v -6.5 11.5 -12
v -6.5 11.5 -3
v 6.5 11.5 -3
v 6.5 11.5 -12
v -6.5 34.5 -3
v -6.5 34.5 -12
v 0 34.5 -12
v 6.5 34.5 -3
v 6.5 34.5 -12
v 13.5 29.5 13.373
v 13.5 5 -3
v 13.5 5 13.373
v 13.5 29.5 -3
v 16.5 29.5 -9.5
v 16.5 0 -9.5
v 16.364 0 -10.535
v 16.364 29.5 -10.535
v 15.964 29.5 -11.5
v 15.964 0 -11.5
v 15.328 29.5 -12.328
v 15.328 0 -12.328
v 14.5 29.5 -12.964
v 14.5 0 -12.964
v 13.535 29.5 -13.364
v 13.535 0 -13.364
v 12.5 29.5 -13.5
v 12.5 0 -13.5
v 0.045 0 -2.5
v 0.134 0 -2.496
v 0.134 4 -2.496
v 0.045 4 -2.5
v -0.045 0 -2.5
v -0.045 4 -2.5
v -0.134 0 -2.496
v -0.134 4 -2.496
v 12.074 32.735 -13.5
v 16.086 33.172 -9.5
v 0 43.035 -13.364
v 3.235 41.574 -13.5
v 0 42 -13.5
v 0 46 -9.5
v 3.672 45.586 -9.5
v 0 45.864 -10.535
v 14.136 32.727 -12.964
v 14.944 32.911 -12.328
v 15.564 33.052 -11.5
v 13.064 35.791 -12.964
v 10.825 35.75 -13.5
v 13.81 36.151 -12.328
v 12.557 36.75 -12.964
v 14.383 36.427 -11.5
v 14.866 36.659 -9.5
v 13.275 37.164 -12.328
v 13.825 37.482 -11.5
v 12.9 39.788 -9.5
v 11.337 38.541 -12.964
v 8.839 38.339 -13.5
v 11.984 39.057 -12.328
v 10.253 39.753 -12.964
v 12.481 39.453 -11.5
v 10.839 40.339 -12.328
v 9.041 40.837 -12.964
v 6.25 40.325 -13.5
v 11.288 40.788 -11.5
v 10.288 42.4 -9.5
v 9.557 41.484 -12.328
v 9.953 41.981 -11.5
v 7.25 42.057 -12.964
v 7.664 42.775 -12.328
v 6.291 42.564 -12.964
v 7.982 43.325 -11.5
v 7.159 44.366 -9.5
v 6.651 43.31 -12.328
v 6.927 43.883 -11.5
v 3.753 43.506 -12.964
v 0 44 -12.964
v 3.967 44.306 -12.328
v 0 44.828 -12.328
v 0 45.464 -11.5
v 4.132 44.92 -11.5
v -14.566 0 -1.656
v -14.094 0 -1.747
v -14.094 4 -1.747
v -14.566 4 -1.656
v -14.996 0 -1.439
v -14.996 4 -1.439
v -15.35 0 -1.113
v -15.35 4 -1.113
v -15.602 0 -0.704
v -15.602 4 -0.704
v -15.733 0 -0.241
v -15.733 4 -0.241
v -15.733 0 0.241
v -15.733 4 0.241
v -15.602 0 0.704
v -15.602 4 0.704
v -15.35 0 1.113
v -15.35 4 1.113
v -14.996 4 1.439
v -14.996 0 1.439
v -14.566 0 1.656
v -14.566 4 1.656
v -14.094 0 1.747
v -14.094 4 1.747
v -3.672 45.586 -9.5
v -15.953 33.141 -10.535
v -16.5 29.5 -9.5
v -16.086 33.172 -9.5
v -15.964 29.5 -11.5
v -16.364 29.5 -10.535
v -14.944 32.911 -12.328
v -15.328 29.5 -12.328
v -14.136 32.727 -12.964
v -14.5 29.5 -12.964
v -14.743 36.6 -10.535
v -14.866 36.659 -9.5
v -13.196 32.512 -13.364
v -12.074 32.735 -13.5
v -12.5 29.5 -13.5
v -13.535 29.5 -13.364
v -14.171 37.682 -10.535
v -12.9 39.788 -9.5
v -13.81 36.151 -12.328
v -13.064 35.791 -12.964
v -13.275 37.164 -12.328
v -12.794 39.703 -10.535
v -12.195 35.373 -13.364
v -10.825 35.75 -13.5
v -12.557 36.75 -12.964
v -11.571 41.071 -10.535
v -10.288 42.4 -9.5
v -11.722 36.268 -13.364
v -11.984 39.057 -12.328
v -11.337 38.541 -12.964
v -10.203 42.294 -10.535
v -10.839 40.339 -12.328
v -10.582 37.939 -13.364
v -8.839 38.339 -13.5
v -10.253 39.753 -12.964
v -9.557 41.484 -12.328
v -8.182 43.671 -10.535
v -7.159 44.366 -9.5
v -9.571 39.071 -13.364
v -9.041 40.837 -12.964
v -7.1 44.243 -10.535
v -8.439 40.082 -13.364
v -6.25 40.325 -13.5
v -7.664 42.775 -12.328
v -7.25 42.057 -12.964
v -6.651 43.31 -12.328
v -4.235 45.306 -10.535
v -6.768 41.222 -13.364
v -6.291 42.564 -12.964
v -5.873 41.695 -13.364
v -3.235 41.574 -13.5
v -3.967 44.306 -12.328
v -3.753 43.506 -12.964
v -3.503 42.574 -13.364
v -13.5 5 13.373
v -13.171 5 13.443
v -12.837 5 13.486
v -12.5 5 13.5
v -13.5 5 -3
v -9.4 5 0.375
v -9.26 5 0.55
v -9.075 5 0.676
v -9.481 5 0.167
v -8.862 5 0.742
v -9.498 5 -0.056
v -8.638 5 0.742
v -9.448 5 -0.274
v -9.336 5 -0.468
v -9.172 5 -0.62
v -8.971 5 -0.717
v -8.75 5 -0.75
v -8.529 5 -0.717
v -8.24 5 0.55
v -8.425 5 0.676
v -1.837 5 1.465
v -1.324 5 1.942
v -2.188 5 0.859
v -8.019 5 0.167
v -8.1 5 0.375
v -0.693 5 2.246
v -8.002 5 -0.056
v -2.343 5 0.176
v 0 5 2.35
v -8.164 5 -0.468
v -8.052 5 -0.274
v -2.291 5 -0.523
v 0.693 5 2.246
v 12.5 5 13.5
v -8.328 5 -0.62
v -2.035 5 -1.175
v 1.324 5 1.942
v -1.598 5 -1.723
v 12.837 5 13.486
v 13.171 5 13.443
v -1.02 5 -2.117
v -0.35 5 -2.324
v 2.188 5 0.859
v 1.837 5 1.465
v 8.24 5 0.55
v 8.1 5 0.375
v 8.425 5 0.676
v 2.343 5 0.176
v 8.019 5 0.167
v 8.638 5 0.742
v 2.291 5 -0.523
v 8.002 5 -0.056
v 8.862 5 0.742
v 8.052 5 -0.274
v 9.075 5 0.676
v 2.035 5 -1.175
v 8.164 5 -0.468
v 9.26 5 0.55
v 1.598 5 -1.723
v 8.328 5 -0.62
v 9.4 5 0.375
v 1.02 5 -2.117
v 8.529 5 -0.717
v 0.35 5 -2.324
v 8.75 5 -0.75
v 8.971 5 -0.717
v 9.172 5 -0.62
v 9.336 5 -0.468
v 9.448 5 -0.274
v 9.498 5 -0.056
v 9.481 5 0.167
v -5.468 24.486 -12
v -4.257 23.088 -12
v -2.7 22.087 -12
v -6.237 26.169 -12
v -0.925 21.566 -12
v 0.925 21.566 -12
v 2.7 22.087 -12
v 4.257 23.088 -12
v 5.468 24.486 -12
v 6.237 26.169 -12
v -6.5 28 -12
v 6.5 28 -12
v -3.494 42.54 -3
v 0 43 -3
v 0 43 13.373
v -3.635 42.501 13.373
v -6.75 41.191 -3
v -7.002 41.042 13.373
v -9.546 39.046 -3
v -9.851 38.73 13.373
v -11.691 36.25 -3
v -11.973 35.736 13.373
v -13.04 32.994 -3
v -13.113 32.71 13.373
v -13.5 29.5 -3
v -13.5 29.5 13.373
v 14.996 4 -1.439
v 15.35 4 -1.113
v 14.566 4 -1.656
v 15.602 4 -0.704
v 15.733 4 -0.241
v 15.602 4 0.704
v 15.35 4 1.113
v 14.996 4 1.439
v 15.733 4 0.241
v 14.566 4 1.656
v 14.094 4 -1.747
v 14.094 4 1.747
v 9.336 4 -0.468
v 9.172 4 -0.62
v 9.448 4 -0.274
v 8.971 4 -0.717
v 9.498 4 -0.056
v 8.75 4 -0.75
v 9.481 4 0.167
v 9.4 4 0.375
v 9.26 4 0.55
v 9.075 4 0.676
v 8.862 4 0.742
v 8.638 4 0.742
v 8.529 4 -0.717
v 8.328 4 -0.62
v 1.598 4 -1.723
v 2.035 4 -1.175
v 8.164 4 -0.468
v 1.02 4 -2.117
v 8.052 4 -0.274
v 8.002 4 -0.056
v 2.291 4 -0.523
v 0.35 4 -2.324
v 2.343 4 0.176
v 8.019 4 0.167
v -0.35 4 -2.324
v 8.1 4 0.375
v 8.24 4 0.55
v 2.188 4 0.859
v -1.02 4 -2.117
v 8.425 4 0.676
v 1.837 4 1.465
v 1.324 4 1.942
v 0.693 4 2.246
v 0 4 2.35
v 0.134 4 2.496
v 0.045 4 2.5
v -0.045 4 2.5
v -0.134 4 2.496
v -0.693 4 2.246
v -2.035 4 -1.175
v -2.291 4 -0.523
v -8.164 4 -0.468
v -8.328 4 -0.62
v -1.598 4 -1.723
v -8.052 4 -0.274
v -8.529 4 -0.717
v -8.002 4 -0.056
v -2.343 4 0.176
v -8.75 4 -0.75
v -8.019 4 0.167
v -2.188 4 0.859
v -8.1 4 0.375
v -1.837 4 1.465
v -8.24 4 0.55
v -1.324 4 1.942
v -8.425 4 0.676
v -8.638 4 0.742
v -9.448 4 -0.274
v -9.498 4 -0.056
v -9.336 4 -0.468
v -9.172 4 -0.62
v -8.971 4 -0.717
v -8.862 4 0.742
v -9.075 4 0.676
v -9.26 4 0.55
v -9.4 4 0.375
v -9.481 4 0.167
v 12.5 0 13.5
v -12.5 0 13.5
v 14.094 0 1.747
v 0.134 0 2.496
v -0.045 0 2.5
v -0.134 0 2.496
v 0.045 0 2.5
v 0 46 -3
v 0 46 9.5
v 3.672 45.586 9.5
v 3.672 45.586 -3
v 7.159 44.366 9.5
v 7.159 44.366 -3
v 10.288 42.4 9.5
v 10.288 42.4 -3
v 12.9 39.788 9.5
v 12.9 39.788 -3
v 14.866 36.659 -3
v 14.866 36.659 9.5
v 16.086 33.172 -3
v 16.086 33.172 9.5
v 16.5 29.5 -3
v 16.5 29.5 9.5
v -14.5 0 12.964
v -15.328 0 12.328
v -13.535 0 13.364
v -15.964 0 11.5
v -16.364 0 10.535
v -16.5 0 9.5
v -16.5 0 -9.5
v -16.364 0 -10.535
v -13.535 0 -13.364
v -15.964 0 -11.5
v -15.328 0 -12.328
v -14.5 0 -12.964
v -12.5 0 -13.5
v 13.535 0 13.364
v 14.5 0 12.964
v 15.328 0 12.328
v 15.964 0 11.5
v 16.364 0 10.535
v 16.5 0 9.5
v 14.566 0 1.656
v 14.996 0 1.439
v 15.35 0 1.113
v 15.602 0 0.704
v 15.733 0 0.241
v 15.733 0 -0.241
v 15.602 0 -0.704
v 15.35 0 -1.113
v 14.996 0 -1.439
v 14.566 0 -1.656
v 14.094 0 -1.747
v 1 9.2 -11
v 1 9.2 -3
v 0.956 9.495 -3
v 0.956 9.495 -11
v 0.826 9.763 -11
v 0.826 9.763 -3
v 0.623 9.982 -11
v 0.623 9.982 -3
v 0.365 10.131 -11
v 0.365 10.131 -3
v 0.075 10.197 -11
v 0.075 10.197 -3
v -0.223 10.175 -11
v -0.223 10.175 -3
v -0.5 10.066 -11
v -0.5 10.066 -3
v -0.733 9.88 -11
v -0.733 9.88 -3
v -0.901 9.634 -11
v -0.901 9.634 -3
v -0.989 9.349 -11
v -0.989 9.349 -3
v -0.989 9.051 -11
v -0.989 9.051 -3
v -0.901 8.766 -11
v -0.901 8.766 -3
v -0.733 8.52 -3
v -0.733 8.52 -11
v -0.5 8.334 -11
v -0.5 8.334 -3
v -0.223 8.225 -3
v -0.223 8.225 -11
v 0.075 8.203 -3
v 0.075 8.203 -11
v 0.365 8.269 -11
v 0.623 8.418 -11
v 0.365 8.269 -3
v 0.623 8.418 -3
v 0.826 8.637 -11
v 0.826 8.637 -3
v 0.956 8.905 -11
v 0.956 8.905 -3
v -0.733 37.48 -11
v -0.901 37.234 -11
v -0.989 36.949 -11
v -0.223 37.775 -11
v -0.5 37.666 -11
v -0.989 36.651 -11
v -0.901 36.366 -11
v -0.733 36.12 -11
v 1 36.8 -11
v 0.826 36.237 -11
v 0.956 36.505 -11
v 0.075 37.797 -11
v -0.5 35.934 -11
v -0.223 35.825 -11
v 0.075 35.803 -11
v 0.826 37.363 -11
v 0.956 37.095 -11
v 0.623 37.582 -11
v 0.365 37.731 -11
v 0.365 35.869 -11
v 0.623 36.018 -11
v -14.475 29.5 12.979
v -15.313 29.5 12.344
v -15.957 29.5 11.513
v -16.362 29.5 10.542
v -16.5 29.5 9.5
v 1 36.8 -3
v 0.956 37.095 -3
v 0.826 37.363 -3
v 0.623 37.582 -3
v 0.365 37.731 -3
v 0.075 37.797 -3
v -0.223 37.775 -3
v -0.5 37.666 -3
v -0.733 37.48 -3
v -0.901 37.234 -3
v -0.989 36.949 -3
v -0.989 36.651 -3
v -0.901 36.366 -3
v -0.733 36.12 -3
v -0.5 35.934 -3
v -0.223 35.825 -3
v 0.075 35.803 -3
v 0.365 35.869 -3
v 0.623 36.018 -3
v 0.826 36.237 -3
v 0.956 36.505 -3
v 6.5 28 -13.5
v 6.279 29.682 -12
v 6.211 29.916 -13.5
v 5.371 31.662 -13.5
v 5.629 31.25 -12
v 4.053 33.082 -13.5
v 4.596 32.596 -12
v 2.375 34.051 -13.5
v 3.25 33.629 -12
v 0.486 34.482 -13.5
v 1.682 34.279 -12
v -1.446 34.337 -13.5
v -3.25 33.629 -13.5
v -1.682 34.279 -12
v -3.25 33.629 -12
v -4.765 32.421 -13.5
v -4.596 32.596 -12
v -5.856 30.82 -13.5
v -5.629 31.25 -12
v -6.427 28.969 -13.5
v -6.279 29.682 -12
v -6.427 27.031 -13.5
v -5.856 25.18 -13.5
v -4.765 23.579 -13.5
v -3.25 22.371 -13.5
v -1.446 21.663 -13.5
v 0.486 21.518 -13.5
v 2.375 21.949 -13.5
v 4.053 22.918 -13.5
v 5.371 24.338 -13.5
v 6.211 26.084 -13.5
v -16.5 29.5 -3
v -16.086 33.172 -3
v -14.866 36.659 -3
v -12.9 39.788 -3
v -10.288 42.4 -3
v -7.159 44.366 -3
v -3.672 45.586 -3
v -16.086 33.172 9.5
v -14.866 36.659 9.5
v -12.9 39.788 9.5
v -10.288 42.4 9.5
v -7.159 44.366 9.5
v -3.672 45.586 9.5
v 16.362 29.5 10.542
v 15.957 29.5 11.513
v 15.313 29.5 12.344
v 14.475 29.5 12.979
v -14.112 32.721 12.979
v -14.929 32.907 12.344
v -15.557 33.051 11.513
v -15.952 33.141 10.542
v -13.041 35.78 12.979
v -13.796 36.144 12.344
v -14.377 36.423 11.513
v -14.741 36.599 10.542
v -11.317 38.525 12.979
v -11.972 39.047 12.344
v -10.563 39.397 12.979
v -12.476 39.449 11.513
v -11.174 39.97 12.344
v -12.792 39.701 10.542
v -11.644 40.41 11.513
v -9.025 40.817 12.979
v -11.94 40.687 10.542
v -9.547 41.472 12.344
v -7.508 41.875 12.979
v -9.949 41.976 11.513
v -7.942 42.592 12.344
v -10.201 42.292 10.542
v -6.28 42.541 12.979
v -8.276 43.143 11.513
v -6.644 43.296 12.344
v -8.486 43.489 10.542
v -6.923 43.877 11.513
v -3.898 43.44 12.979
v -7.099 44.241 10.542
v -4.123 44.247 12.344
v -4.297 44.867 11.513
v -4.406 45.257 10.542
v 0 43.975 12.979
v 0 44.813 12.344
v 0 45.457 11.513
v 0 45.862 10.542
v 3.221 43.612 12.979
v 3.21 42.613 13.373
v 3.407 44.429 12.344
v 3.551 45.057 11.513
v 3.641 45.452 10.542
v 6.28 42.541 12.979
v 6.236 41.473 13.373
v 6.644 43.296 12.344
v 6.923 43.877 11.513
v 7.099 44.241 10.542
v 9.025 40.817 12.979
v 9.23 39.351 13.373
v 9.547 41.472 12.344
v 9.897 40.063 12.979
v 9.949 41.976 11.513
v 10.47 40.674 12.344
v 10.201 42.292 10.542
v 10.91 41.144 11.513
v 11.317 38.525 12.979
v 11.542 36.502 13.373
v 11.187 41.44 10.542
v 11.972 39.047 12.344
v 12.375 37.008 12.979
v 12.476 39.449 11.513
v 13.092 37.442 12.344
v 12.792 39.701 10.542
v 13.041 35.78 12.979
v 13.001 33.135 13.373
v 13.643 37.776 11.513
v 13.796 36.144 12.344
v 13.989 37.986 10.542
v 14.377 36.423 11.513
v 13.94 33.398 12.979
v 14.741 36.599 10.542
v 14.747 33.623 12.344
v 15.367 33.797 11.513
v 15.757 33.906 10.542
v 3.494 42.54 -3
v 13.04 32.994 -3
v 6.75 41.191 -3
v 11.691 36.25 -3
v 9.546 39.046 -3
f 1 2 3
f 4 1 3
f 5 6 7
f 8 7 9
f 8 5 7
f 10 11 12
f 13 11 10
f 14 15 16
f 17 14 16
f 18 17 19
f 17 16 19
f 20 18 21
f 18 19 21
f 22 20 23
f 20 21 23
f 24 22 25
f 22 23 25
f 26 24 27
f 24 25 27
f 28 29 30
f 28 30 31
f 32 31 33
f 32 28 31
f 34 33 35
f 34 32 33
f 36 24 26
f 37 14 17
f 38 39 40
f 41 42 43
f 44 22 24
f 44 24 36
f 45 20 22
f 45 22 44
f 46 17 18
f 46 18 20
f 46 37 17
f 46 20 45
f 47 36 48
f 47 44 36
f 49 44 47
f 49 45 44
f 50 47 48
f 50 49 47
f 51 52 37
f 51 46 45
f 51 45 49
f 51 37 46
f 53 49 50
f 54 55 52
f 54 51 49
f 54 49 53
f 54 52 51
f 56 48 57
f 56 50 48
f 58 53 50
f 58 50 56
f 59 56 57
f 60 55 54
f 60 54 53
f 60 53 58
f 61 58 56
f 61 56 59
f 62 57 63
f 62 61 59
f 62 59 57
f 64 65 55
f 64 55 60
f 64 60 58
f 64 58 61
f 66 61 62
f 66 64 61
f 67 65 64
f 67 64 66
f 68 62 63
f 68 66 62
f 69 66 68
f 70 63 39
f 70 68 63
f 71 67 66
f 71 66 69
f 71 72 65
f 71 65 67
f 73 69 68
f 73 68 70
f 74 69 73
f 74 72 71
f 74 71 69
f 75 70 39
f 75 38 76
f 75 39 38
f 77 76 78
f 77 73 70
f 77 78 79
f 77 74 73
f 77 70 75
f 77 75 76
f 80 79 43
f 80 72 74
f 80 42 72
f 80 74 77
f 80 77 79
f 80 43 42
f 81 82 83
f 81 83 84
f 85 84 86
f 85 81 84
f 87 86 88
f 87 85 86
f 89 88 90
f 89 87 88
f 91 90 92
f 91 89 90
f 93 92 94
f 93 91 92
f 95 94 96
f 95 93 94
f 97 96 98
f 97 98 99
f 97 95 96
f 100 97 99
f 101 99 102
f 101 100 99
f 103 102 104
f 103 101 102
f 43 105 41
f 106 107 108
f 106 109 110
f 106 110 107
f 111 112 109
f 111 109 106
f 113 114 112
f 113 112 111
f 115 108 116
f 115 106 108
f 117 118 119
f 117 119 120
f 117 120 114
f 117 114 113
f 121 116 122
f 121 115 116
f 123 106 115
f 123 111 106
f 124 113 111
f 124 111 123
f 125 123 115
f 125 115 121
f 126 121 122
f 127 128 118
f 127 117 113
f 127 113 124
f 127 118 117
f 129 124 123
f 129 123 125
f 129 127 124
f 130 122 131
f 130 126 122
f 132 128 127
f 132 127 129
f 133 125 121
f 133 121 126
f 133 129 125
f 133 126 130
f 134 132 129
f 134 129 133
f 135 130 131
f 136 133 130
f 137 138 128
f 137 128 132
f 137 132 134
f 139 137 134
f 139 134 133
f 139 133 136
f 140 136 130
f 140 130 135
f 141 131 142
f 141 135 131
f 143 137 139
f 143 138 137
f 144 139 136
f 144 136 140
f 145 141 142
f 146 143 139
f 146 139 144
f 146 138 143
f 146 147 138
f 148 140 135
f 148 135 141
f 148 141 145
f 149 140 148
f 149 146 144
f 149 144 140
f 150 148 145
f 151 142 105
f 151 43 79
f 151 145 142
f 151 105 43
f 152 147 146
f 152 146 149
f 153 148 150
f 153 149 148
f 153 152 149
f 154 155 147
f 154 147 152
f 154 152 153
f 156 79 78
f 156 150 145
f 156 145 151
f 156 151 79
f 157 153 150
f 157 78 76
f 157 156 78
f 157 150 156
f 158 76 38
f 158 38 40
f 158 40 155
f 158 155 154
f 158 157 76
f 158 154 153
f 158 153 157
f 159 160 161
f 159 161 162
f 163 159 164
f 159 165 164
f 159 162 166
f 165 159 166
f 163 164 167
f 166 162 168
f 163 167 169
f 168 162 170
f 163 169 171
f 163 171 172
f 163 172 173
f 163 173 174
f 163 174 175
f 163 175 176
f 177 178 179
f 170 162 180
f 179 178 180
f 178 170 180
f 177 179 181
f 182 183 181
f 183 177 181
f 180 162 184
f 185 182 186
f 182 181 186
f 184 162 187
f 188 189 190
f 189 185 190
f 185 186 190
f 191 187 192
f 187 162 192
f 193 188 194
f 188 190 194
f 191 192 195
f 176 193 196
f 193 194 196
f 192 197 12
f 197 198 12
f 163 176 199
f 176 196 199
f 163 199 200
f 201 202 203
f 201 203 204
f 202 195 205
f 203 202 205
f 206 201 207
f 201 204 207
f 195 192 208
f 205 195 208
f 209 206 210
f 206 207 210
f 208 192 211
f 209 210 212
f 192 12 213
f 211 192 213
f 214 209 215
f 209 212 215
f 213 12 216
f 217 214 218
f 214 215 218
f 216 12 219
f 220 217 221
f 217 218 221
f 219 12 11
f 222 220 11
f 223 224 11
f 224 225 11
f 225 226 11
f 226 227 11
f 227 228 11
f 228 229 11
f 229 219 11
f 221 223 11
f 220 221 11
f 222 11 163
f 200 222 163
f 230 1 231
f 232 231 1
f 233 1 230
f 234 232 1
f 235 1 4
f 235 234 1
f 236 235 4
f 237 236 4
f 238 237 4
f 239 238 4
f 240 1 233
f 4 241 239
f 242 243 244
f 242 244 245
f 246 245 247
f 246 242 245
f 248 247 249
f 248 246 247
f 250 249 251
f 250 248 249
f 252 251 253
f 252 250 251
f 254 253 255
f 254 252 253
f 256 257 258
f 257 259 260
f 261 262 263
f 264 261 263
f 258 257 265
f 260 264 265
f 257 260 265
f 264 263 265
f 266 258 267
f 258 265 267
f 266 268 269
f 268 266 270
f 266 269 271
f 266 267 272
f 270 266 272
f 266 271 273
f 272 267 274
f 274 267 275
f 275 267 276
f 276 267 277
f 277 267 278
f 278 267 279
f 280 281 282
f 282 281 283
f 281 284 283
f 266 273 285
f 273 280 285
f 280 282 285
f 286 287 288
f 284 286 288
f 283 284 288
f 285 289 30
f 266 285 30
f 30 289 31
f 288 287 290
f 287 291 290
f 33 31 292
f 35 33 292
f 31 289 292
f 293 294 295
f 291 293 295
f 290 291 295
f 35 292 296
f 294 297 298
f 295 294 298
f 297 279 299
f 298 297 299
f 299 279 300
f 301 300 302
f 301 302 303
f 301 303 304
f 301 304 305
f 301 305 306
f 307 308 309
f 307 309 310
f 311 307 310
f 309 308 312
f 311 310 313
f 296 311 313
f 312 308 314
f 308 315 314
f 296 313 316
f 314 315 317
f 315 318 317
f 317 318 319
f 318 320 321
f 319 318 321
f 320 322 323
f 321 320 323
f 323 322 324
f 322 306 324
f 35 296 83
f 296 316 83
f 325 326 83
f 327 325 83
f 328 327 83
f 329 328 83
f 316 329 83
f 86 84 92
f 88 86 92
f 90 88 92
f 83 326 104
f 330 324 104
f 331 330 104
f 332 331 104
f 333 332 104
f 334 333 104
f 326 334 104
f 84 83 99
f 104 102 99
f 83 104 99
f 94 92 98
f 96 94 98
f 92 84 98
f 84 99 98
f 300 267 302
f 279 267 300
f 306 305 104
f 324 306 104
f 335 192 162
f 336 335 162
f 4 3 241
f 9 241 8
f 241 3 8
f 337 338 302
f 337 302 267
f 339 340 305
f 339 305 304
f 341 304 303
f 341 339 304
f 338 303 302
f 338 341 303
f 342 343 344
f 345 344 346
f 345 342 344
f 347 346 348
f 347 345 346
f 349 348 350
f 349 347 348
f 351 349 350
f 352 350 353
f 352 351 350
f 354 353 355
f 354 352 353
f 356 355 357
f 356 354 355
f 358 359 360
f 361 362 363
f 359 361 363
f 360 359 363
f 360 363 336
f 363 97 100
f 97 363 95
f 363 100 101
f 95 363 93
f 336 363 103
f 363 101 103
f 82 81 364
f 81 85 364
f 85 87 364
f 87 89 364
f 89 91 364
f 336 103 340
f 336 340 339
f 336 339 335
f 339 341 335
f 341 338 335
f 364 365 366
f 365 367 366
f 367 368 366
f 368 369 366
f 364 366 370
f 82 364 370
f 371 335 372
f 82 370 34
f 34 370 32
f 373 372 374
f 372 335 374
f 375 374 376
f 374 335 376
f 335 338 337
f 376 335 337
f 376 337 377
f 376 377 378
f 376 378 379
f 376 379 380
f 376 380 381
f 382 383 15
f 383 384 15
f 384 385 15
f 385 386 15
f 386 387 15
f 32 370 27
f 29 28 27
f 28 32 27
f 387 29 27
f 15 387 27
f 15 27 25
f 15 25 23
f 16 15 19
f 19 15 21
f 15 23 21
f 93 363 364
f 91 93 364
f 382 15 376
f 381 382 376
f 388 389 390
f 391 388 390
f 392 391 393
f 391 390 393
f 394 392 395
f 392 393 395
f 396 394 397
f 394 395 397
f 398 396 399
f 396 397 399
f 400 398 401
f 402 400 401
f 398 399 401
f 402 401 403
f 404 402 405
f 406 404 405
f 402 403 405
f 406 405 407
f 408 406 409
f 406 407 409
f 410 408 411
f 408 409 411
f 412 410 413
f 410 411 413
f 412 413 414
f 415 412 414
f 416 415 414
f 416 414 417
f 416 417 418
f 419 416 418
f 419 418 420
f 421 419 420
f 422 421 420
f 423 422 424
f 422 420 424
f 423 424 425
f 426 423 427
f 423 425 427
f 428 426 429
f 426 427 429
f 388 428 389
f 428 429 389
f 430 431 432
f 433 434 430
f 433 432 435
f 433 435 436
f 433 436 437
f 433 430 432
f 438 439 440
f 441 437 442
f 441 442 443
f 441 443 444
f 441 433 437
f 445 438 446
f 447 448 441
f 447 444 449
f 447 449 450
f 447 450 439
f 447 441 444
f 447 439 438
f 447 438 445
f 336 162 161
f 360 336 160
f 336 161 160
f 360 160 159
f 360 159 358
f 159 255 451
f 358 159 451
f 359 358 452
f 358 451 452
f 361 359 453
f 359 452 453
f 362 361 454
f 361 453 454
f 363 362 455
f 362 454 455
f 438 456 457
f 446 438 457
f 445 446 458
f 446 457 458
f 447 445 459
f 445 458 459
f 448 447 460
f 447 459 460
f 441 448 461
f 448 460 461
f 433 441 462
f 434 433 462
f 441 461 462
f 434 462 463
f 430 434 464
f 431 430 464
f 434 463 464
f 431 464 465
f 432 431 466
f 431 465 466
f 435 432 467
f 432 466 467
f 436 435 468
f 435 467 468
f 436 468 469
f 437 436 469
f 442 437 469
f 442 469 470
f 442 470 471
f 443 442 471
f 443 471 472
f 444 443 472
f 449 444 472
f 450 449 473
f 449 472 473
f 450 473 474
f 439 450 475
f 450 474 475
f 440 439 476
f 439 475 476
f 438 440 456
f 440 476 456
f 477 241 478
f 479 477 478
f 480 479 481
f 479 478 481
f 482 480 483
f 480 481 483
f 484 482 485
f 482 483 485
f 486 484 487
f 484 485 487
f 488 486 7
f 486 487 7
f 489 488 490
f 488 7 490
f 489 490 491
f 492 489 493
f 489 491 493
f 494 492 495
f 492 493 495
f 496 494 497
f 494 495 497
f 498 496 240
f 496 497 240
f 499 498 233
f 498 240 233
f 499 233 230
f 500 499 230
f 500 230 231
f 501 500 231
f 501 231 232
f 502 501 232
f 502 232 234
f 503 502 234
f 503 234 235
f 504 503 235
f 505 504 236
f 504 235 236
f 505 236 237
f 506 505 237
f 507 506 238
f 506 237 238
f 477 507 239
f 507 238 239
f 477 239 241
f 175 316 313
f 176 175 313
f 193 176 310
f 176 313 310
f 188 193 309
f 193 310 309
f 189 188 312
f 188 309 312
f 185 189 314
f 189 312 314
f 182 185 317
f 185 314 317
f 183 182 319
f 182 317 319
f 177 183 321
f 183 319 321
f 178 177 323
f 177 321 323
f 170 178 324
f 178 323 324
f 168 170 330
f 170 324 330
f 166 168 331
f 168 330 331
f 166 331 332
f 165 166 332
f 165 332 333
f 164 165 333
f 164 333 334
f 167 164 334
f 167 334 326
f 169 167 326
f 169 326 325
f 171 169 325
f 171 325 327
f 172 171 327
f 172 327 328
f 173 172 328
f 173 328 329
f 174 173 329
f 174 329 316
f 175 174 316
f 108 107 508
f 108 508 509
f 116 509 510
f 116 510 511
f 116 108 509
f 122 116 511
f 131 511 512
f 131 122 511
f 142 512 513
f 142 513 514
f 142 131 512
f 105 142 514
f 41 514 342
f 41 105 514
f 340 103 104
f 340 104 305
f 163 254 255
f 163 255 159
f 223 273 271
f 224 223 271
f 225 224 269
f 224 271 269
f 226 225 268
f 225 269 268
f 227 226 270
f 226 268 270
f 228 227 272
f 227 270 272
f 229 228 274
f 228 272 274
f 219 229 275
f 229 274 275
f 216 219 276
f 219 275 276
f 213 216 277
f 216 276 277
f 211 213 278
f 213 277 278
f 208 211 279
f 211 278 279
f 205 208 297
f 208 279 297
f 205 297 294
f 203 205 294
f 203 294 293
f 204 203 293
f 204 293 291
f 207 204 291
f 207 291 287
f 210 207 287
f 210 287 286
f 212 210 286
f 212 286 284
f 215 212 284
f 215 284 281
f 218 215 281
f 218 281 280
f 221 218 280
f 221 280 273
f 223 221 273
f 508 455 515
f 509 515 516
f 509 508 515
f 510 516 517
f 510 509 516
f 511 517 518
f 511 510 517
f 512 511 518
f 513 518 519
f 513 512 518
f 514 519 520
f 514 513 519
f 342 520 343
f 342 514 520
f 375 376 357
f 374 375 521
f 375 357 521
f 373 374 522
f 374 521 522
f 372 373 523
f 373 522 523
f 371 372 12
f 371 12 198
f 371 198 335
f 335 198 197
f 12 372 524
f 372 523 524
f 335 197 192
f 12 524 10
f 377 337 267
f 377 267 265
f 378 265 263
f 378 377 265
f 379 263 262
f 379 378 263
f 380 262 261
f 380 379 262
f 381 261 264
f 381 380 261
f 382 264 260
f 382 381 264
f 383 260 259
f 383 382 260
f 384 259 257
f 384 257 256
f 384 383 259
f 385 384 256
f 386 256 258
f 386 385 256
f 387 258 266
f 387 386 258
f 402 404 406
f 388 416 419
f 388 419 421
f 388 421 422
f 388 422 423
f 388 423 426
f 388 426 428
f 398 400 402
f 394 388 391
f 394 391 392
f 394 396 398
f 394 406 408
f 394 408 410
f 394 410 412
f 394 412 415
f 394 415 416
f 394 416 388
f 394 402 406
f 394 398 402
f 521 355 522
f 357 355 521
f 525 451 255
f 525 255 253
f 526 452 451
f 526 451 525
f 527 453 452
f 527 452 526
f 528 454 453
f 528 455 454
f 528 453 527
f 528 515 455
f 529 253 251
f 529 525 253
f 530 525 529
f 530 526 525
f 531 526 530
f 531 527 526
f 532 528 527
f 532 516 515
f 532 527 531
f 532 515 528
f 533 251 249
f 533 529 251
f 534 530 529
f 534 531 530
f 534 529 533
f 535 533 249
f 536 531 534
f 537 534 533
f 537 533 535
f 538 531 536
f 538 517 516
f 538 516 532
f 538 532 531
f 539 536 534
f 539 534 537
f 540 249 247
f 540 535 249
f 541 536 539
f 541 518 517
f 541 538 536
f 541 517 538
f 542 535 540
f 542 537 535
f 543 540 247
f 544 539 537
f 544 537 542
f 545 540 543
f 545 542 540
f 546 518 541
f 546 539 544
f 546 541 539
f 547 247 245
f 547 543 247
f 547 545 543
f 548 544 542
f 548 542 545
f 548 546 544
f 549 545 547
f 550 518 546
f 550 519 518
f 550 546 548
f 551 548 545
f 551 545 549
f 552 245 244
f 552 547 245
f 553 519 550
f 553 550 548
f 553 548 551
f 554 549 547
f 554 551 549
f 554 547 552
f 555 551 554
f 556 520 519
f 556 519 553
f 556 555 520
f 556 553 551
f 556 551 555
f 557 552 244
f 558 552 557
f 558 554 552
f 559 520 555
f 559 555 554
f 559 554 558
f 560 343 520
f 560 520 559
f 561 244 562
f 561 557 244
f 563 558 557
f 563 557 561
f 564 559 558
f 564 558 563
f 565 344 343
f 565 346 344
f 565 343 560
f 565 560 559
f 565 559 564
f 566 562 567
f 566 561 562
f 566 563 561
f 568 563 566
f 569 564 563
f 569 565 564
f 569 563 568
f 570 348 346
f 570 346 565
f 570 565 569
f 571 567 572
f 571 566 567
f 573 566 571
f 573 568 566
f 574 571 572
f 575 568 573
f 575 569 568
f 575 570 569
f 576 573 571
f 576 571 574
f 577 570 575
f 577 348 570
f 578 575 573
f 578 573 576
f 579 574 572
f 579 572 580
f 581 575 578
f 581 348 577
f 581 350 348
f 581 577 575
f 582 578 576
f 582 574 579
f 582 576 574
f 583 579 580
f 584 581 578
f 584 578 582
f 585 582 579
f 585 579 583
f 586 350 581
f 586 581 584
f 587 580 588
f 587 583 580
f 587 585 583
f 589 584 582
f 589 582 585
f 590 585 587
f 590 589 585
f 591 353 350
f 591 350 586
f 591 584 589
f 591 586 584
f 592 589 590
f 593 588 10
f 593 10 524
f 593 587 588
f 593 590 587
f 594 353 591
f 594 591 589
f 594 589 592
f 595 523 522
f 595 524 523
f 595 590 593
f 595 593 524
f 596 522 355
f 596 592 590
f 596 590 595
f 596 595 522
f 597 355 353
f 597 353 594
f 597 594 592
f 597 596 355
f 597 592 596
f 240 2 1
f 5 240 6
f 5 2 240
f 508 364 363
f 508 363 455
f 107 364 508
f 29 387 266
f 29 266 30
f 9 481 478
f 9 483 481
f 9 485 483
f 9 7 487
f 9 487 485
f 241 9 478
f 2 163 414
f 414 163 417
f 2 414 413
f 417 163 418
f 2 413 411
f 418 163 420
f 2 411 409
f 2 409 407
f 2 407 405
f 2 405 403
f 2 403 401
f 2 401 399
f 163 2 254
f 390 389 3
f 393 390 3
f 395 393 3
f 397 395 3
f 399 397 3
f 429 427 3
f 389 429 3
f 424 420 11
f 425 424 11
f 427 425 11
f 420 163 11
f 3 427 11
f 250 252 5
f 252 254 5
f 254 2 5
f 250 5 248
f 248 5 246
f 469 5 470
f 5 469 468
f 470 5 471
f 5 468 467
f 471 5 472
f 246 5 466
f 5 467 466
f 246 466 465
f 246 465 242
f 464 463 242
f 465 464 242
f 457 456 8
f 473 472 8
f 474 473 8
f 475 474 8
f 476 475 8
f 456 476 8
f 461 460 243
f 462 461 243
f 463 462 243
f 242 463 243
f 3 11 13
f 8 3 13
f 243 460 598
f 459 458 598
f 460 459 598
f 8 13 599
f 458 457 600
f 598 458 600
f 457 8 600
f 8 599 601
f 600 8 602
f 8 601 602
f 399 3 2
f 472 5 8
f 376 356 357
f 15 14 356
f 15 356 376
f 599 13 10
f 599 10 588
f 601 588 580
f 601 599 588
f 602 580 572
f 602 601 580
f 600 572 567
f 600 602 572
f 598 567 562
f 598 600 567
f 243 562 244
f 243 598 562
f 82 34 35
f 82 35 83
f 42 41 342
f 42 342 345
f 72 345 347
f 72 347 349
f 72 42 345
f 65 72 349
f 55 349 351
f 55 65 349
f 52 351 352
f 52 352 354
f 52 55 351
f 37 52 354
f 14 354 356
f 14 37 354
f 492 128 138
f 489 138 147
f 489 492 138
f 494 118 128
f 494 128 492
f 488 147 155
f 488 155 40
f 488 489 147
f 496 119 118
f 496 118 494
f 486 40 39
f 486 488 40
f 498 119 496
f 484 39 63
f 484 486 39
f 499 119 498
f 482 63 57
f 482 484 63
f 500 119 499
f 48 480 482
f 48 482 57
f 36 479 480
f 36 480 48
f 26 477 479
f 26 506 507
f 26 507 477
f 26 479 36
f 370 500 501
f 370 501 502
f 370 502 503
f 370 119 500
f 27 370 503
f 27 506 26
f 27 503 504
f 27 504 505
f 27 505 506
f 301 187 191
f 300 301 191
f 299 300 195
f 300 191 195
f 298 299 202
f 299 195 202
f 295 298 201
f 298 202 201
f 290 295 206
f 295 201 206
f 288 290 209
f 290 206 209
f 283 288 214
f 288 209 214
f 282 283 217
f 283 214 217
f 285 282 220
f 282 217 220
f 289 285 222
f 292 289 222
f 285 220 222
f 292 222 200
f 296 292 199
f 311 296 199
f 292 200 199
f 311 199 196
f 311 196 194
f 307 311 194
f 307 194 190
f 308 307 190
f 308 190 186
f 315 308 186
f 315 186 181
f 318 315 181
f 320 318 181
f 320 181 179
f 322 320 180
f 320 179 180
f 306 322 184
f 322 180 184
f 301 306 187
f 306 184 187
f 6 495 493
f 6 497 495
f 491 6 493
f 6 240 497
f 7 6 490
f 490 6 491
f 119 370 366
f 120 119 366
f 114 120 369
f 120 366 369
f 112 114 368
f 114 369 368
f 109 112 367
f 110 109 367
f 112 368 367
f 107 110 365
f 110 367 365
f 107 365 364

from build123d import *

# Parameters (mm, degrees)
SKETCH1_W           = 33
SKETCH1_H           = 27
BOSS_EXTRUDE1_DEPTH = 46
SKETCH3_W           = 16.5
SKETCH3_H           = 41
CUT_EXTRUDE2_DEPTH  = 59.200085911
FILLET3_R           = 16.5
SKETCH9_W           = 13
SKETCH9_H           = 23
CUT_EXTRUDE4_DEPTH  = 9
SKETCH10_R          = 6.5
CUT_EXTRUDE5_DEPTH  = 56.12259065
SKETCH11_R          = 1
CUT_EXTRUDE6_DEPTH  = 8
BOSS_EXTRUDE7_DEPTH = 16.5
FILLET5_R           = 4
CUT_EXTRUDE7_DEPTH  = 4
SKETCH17_R          = 1.3
CUT_EXTRUDE8_DEPTH  = 1.75
SKETCH18_R          = 2.35
CUT_EXTRUDE9_DEPTH  = 1
SKETCH19_R          = 0.75
CUT_EXTRUDE10_DEPTH = 1.75


# Some blends are built 0.0001 mm under size
with BuildPart() as part:
    # Sketch1 → Boss-Extrude1 (new body)
    with BuildSketch(Plane(origin=(0, 0, 0), x_dir=(1, 0, 0), z_dir=(0, 1, 0))):
        Rectangle(SKETCH1_W, SKETCH1_H)
    extrude(amount=BOSS_EXTRUDE1_DEPTH)

    # Sketch3 → Cut-Extrude2 (cut, through all)
    with BuildSketch(Plane(origin=(16.5, 0, 0), x_dir=(0, 0, -1), z_dir=(1, 0, 0))):
        with Locations((-5.25, 25.5)):
            Rectangle(SKETCH3_W, SKETCH3_H)
    extrude(amount=-CUT_EXTRUDE2_DEPTH, mode=Mode.SUBTRACT)

    # Fillet3
    fillet3_edges = [part.edges().sort_by_distance(p)[0] for p in [
        (-16.5, 46, -8.25),
        (16.5, 46, -8.25),
    ]]
    fillet(fillet3_edges, radius=FILLET3_R - 0.0001)  # a hair under: the kernel refuses the full size

    # Sketch9 → Cut-Extrude4 (cut)
    with BuildSketch(Plane.XY.offset(-3)):
        with Locations((0, 23)):
            Rectangle(SKETCH9_W, SKETCH9_H)
    extrude(amount=-CUT_EXTRUDE4_DEPTH, mode=Mode.SUBTRACT)

    # Sketch10 → Cut-Extrude5 (cut, through all)
    with BuildSketch(Plane.XY.offset(-12)):
        with Locations((0, 28)):
            Circle(SKETCH10_R)
    extrude(amount=-CUT_EXTRUDE5_DEPTH, mode=Mode.SUBTRACT)

    # Sketch11 → Cut-Extrude6 (cut)
    with BuildSketch(Plane.XY.offset(-3)):
        with Locations((0, 36.8)):
            Circle(SKETCH11_R)
        with Locations((0, 9.2)):
            Circle(SKETCH11_R)
    extrude(amount=-CUT_EXTRUDE6_DEPTH, mode=Mode.SUBTRACT)

    # Sketch15 → Boss-Extrude7 (add)
    with BuildSketch(Plane.XY.offset(-3)):
        with BuildLine():
            Line((13.5, 5), (13.5, 29.5))
            ThreePointArc((13.5, 29.5), (9.545941546, 39.045941546), (0, 43))
            ThreePointArc((0, 43), (-9.545941546, 39.045941546), (-13.5, 29.5))
            Line((-13.5, 29.5), (-13.5, 5))
            Line((-13.5, 5), (-16.5, 5))
            Line((-16.5, 5), (-16.5, 29.5))
            ThreePointArc((-16.5, 29.5), (-11.66726189, 41.16726189), (0, 46))
            ThreePointArc((0, 46), (11.66726189, 41.16726189), (16.5, 29.5))
            Line((16.5, 29.5), (16.5, 5))
            Line((16.5, 5), (13.5, 5))
        make_face()
    extrude(amount=BOSS_EXTRUDE7_DEPTH)

    # Fillet5
    # the kernel refuses this fillet: 4 mm, written as the material it takes off along each edge
    with BuildSketch(Plane(origin=(16.5, 29.5, 13.5), x_dir=(0, 0, -1), z_dir=(0, -1, 0))) as fillet5_piece_1:
        with BuildLine():
            CenterArc((FILLET5_R, -FILLET5_R), FILLET5_R, 90, 90)
            Line((0, -FILLET5_R), (0, 0))
            Line((0, 0), (FILLET5_R, 0))
        make_face()
    extrude(amount=39.5, mode=Mode.SUBTRACT)
    with BuildSketch(Plane(origin=(-16.5, 29.5, 13.5), x_dir=(0, 0, -1), z_dir=(0, -1, 0))) as fillet5_piece_2:
        with BuildLine():
            CenterArc((FILLET5_R, FILLET5_R), FILLET5_R, 180, 90)
            Line((0, FILLET5_R), (0, 0))
            Line((0, 0), (FILLET5_R, 0))
        make_face()
    extrude(amount=39.5, mode=Mode.SUBTRACT)
    with BuildSketch(Plane(origin=(-16.5, -10, -13.5), x_dir=(0, 0, 1), z_dir=(0, 1, 0))) as fillet5_piece_3:
        with BuildLine():
            CenterArc((FILLET5_R, FILLET5_R), FILLET5_R, 180, 90)
            Line((0, FILLET5_R), (0, 0))
            Line((0, 0), (FILLET5_R, 0))
        make_face()
    extrude(amount=39.5001, mode=Mode.SUBTRACT)
    with BuildSketch(Plane(origin=(16.5, -10, -13.5), x_dir=(0, 0, 1), z_dir=(0, 1, 0))) as fillet5_piece_4:
        with BuildLine():
            CenterArc((FILLET5_R, -FILLET5_R), FILLET5_R, 90, 90)
            Line((0, -FILLET5_R), (0, 0))
            Line((0, 0), (FILLET5_R, 0))
        make_face()
    extrude(amount=39.5001, mode=Mode.SUBTRACT)
    with BuildSketch(Plane(origin=(0.0001, 29.5001, -13.5), x_dir=(1, 0, 0), z_dir=(0, -1, 0))) as fillet5_piece_5:
        with BuildLine():
            CenterArc((16.4999 - FILLET5_R, FILLET5_R), FILLET5_R, 270, 90)
            Line((16.4999 - FILLET5_R, 0), (16.4999, 0))
            Line((16.4999, 0), (16.4999, FILLET5_R))
        make_face()
    revolve(axis=Axis((0.0001, 29.5001, -13.5), (0, 0, 1)), revolution_arc=90, mode=Mode.SUBTRACT)
    with BuildSketch(Plane(origin=(0, 29.5, 13.5), x_dir=(-1, 0, 0), z_dir=(0, -1, 0))) as fillet5_piece_6:
        with BuildLine():
            CenterArc((16.5 - FILLET5_R, FILLET5_R), FILLET5_R, 270, 90)
            Line((16.5 - FILLET5_R, 0), (16.5, 0))
            Line((16.5, 0), (16.5, FILLET5_R))
        make_face()
    revolve(axis=Axis((0, 29.5, 13.5), (0, 0, -1)), revolution_arc=180, mode=Mode.SUBTRACT)
    with BuildSketch(Plane(origin=(0.0001, 46, -13.5), x_dir=(0, 0, 1), z_dir=(-1, 0, 0))) as fillet5_piece_7:
        with BuildLine():
            CenterArc((FILLET5_R, -FILLET5_R), FILLET5_R, 90, 90)
            Line((0, -FILLET5_R), (0, 0))
            Line((0, 0), (FILLET5_R, 0))
        make_face()
    extrude(amount=0.0002, mode=Mode.SUBTRACT)
    with BuildSketch(Plane(origin=(-0.0001, 29.5001, -13.5), x_dir=(-1, 0, 0), z_dir=(0, -1, 0))) as fillet5_piece_8:
        with BuildLine():
            CenterArc((16.4999 - FILLET5_R, -FILLET5_R), FILLET5_R, 0, 90)
            Line((16.4999 - FILLET5_R, 0), (16.4999, 0))
            Line((16.4999, 0), (16.4999, -FILLET5_R))
        make_face()
    revolve(axis=Axis((-0.0001, 29.5001, -13.5), (0, 0, -1)), revolution_arc=90, mode=Mode.SUBTRACT)

    # Sketch4 → Cut-Extrude7 (cut)
    with BuildSketch(Plane.XZ):
        with BuildLine():
            Line((0.133928571, 2.49641005), (14.09375, 1.747487035))
            ThreePointArc((14.09375, 1.747487035), (15.75, 0), (14.09375, -1.747487035))
            Line((14.09375, -1.747487035), (0.133928571, -2.49641005))
            ThreePointArc((0.133928571, -2.49641005), (0, -2.5), (-0.133928571, -2.49641005))
            Line((-0.133928571, -2.49641005), (-14.09375, -1.747487035))
            ThreePointArc((-14.09375, -1.747487035), (-15.75, 0), (-14.09375, 1.747487035))
            Line((-14.09375, 1.747487035), (-0.133928571, 2.49641005))
            ThreePointArc((-0.133928571, 2.49641005), (0, 2.5), (0.133928571, 2.49641005))
        make_face()
    extrude(amount=-CUT_EXTRUDE7_DEPTH, mode=Mode.SUBTRACT)

    # Sketch17 → Cut-Extrude8 (cut)
    with BuildSketch(Plane.XZ.offset(-4)):
        with Locations(Location((0, 0, 0), (0, 0, 270))):
            Circle(SKETCH17_R)
    extrude(amount=-CUT_EXTRUDE8_DEPTH, mode=Mode.SUBTRACT)

    # Sketch18 → Cut-Extrude9 (cut)
    with BuildSketch(Plane(origin=(0, 5, 0), x_dir=(1, 0, 0), z_dir=(0, 1, 0))):
        with Locations(Location((0, 0, 0), (0, 0, 270))):
            Circle(SKETCH18_R)
    extrude(amount=-CUT_EXTRUDE9_DEPTH, mode=Mode.SUBTRACT)

    # Sketch19 → Cut-Extrude10 (cut)
    with BuildSketch(Plane.XZ.offset(-4)):
        with Locations(Location((-8.75, 0, 0), (0, 0, 270))):
            Circle(SKETCH19_R)
        with Locations(Location((8.75, 0, 0), (0, 0, 270))):
            Circle(SKETCH19_R)
    extrude(amount=-CUT_EXTRUDE10_DEPTH, mode=Mode.SUBTRACT)


solid = part.part
